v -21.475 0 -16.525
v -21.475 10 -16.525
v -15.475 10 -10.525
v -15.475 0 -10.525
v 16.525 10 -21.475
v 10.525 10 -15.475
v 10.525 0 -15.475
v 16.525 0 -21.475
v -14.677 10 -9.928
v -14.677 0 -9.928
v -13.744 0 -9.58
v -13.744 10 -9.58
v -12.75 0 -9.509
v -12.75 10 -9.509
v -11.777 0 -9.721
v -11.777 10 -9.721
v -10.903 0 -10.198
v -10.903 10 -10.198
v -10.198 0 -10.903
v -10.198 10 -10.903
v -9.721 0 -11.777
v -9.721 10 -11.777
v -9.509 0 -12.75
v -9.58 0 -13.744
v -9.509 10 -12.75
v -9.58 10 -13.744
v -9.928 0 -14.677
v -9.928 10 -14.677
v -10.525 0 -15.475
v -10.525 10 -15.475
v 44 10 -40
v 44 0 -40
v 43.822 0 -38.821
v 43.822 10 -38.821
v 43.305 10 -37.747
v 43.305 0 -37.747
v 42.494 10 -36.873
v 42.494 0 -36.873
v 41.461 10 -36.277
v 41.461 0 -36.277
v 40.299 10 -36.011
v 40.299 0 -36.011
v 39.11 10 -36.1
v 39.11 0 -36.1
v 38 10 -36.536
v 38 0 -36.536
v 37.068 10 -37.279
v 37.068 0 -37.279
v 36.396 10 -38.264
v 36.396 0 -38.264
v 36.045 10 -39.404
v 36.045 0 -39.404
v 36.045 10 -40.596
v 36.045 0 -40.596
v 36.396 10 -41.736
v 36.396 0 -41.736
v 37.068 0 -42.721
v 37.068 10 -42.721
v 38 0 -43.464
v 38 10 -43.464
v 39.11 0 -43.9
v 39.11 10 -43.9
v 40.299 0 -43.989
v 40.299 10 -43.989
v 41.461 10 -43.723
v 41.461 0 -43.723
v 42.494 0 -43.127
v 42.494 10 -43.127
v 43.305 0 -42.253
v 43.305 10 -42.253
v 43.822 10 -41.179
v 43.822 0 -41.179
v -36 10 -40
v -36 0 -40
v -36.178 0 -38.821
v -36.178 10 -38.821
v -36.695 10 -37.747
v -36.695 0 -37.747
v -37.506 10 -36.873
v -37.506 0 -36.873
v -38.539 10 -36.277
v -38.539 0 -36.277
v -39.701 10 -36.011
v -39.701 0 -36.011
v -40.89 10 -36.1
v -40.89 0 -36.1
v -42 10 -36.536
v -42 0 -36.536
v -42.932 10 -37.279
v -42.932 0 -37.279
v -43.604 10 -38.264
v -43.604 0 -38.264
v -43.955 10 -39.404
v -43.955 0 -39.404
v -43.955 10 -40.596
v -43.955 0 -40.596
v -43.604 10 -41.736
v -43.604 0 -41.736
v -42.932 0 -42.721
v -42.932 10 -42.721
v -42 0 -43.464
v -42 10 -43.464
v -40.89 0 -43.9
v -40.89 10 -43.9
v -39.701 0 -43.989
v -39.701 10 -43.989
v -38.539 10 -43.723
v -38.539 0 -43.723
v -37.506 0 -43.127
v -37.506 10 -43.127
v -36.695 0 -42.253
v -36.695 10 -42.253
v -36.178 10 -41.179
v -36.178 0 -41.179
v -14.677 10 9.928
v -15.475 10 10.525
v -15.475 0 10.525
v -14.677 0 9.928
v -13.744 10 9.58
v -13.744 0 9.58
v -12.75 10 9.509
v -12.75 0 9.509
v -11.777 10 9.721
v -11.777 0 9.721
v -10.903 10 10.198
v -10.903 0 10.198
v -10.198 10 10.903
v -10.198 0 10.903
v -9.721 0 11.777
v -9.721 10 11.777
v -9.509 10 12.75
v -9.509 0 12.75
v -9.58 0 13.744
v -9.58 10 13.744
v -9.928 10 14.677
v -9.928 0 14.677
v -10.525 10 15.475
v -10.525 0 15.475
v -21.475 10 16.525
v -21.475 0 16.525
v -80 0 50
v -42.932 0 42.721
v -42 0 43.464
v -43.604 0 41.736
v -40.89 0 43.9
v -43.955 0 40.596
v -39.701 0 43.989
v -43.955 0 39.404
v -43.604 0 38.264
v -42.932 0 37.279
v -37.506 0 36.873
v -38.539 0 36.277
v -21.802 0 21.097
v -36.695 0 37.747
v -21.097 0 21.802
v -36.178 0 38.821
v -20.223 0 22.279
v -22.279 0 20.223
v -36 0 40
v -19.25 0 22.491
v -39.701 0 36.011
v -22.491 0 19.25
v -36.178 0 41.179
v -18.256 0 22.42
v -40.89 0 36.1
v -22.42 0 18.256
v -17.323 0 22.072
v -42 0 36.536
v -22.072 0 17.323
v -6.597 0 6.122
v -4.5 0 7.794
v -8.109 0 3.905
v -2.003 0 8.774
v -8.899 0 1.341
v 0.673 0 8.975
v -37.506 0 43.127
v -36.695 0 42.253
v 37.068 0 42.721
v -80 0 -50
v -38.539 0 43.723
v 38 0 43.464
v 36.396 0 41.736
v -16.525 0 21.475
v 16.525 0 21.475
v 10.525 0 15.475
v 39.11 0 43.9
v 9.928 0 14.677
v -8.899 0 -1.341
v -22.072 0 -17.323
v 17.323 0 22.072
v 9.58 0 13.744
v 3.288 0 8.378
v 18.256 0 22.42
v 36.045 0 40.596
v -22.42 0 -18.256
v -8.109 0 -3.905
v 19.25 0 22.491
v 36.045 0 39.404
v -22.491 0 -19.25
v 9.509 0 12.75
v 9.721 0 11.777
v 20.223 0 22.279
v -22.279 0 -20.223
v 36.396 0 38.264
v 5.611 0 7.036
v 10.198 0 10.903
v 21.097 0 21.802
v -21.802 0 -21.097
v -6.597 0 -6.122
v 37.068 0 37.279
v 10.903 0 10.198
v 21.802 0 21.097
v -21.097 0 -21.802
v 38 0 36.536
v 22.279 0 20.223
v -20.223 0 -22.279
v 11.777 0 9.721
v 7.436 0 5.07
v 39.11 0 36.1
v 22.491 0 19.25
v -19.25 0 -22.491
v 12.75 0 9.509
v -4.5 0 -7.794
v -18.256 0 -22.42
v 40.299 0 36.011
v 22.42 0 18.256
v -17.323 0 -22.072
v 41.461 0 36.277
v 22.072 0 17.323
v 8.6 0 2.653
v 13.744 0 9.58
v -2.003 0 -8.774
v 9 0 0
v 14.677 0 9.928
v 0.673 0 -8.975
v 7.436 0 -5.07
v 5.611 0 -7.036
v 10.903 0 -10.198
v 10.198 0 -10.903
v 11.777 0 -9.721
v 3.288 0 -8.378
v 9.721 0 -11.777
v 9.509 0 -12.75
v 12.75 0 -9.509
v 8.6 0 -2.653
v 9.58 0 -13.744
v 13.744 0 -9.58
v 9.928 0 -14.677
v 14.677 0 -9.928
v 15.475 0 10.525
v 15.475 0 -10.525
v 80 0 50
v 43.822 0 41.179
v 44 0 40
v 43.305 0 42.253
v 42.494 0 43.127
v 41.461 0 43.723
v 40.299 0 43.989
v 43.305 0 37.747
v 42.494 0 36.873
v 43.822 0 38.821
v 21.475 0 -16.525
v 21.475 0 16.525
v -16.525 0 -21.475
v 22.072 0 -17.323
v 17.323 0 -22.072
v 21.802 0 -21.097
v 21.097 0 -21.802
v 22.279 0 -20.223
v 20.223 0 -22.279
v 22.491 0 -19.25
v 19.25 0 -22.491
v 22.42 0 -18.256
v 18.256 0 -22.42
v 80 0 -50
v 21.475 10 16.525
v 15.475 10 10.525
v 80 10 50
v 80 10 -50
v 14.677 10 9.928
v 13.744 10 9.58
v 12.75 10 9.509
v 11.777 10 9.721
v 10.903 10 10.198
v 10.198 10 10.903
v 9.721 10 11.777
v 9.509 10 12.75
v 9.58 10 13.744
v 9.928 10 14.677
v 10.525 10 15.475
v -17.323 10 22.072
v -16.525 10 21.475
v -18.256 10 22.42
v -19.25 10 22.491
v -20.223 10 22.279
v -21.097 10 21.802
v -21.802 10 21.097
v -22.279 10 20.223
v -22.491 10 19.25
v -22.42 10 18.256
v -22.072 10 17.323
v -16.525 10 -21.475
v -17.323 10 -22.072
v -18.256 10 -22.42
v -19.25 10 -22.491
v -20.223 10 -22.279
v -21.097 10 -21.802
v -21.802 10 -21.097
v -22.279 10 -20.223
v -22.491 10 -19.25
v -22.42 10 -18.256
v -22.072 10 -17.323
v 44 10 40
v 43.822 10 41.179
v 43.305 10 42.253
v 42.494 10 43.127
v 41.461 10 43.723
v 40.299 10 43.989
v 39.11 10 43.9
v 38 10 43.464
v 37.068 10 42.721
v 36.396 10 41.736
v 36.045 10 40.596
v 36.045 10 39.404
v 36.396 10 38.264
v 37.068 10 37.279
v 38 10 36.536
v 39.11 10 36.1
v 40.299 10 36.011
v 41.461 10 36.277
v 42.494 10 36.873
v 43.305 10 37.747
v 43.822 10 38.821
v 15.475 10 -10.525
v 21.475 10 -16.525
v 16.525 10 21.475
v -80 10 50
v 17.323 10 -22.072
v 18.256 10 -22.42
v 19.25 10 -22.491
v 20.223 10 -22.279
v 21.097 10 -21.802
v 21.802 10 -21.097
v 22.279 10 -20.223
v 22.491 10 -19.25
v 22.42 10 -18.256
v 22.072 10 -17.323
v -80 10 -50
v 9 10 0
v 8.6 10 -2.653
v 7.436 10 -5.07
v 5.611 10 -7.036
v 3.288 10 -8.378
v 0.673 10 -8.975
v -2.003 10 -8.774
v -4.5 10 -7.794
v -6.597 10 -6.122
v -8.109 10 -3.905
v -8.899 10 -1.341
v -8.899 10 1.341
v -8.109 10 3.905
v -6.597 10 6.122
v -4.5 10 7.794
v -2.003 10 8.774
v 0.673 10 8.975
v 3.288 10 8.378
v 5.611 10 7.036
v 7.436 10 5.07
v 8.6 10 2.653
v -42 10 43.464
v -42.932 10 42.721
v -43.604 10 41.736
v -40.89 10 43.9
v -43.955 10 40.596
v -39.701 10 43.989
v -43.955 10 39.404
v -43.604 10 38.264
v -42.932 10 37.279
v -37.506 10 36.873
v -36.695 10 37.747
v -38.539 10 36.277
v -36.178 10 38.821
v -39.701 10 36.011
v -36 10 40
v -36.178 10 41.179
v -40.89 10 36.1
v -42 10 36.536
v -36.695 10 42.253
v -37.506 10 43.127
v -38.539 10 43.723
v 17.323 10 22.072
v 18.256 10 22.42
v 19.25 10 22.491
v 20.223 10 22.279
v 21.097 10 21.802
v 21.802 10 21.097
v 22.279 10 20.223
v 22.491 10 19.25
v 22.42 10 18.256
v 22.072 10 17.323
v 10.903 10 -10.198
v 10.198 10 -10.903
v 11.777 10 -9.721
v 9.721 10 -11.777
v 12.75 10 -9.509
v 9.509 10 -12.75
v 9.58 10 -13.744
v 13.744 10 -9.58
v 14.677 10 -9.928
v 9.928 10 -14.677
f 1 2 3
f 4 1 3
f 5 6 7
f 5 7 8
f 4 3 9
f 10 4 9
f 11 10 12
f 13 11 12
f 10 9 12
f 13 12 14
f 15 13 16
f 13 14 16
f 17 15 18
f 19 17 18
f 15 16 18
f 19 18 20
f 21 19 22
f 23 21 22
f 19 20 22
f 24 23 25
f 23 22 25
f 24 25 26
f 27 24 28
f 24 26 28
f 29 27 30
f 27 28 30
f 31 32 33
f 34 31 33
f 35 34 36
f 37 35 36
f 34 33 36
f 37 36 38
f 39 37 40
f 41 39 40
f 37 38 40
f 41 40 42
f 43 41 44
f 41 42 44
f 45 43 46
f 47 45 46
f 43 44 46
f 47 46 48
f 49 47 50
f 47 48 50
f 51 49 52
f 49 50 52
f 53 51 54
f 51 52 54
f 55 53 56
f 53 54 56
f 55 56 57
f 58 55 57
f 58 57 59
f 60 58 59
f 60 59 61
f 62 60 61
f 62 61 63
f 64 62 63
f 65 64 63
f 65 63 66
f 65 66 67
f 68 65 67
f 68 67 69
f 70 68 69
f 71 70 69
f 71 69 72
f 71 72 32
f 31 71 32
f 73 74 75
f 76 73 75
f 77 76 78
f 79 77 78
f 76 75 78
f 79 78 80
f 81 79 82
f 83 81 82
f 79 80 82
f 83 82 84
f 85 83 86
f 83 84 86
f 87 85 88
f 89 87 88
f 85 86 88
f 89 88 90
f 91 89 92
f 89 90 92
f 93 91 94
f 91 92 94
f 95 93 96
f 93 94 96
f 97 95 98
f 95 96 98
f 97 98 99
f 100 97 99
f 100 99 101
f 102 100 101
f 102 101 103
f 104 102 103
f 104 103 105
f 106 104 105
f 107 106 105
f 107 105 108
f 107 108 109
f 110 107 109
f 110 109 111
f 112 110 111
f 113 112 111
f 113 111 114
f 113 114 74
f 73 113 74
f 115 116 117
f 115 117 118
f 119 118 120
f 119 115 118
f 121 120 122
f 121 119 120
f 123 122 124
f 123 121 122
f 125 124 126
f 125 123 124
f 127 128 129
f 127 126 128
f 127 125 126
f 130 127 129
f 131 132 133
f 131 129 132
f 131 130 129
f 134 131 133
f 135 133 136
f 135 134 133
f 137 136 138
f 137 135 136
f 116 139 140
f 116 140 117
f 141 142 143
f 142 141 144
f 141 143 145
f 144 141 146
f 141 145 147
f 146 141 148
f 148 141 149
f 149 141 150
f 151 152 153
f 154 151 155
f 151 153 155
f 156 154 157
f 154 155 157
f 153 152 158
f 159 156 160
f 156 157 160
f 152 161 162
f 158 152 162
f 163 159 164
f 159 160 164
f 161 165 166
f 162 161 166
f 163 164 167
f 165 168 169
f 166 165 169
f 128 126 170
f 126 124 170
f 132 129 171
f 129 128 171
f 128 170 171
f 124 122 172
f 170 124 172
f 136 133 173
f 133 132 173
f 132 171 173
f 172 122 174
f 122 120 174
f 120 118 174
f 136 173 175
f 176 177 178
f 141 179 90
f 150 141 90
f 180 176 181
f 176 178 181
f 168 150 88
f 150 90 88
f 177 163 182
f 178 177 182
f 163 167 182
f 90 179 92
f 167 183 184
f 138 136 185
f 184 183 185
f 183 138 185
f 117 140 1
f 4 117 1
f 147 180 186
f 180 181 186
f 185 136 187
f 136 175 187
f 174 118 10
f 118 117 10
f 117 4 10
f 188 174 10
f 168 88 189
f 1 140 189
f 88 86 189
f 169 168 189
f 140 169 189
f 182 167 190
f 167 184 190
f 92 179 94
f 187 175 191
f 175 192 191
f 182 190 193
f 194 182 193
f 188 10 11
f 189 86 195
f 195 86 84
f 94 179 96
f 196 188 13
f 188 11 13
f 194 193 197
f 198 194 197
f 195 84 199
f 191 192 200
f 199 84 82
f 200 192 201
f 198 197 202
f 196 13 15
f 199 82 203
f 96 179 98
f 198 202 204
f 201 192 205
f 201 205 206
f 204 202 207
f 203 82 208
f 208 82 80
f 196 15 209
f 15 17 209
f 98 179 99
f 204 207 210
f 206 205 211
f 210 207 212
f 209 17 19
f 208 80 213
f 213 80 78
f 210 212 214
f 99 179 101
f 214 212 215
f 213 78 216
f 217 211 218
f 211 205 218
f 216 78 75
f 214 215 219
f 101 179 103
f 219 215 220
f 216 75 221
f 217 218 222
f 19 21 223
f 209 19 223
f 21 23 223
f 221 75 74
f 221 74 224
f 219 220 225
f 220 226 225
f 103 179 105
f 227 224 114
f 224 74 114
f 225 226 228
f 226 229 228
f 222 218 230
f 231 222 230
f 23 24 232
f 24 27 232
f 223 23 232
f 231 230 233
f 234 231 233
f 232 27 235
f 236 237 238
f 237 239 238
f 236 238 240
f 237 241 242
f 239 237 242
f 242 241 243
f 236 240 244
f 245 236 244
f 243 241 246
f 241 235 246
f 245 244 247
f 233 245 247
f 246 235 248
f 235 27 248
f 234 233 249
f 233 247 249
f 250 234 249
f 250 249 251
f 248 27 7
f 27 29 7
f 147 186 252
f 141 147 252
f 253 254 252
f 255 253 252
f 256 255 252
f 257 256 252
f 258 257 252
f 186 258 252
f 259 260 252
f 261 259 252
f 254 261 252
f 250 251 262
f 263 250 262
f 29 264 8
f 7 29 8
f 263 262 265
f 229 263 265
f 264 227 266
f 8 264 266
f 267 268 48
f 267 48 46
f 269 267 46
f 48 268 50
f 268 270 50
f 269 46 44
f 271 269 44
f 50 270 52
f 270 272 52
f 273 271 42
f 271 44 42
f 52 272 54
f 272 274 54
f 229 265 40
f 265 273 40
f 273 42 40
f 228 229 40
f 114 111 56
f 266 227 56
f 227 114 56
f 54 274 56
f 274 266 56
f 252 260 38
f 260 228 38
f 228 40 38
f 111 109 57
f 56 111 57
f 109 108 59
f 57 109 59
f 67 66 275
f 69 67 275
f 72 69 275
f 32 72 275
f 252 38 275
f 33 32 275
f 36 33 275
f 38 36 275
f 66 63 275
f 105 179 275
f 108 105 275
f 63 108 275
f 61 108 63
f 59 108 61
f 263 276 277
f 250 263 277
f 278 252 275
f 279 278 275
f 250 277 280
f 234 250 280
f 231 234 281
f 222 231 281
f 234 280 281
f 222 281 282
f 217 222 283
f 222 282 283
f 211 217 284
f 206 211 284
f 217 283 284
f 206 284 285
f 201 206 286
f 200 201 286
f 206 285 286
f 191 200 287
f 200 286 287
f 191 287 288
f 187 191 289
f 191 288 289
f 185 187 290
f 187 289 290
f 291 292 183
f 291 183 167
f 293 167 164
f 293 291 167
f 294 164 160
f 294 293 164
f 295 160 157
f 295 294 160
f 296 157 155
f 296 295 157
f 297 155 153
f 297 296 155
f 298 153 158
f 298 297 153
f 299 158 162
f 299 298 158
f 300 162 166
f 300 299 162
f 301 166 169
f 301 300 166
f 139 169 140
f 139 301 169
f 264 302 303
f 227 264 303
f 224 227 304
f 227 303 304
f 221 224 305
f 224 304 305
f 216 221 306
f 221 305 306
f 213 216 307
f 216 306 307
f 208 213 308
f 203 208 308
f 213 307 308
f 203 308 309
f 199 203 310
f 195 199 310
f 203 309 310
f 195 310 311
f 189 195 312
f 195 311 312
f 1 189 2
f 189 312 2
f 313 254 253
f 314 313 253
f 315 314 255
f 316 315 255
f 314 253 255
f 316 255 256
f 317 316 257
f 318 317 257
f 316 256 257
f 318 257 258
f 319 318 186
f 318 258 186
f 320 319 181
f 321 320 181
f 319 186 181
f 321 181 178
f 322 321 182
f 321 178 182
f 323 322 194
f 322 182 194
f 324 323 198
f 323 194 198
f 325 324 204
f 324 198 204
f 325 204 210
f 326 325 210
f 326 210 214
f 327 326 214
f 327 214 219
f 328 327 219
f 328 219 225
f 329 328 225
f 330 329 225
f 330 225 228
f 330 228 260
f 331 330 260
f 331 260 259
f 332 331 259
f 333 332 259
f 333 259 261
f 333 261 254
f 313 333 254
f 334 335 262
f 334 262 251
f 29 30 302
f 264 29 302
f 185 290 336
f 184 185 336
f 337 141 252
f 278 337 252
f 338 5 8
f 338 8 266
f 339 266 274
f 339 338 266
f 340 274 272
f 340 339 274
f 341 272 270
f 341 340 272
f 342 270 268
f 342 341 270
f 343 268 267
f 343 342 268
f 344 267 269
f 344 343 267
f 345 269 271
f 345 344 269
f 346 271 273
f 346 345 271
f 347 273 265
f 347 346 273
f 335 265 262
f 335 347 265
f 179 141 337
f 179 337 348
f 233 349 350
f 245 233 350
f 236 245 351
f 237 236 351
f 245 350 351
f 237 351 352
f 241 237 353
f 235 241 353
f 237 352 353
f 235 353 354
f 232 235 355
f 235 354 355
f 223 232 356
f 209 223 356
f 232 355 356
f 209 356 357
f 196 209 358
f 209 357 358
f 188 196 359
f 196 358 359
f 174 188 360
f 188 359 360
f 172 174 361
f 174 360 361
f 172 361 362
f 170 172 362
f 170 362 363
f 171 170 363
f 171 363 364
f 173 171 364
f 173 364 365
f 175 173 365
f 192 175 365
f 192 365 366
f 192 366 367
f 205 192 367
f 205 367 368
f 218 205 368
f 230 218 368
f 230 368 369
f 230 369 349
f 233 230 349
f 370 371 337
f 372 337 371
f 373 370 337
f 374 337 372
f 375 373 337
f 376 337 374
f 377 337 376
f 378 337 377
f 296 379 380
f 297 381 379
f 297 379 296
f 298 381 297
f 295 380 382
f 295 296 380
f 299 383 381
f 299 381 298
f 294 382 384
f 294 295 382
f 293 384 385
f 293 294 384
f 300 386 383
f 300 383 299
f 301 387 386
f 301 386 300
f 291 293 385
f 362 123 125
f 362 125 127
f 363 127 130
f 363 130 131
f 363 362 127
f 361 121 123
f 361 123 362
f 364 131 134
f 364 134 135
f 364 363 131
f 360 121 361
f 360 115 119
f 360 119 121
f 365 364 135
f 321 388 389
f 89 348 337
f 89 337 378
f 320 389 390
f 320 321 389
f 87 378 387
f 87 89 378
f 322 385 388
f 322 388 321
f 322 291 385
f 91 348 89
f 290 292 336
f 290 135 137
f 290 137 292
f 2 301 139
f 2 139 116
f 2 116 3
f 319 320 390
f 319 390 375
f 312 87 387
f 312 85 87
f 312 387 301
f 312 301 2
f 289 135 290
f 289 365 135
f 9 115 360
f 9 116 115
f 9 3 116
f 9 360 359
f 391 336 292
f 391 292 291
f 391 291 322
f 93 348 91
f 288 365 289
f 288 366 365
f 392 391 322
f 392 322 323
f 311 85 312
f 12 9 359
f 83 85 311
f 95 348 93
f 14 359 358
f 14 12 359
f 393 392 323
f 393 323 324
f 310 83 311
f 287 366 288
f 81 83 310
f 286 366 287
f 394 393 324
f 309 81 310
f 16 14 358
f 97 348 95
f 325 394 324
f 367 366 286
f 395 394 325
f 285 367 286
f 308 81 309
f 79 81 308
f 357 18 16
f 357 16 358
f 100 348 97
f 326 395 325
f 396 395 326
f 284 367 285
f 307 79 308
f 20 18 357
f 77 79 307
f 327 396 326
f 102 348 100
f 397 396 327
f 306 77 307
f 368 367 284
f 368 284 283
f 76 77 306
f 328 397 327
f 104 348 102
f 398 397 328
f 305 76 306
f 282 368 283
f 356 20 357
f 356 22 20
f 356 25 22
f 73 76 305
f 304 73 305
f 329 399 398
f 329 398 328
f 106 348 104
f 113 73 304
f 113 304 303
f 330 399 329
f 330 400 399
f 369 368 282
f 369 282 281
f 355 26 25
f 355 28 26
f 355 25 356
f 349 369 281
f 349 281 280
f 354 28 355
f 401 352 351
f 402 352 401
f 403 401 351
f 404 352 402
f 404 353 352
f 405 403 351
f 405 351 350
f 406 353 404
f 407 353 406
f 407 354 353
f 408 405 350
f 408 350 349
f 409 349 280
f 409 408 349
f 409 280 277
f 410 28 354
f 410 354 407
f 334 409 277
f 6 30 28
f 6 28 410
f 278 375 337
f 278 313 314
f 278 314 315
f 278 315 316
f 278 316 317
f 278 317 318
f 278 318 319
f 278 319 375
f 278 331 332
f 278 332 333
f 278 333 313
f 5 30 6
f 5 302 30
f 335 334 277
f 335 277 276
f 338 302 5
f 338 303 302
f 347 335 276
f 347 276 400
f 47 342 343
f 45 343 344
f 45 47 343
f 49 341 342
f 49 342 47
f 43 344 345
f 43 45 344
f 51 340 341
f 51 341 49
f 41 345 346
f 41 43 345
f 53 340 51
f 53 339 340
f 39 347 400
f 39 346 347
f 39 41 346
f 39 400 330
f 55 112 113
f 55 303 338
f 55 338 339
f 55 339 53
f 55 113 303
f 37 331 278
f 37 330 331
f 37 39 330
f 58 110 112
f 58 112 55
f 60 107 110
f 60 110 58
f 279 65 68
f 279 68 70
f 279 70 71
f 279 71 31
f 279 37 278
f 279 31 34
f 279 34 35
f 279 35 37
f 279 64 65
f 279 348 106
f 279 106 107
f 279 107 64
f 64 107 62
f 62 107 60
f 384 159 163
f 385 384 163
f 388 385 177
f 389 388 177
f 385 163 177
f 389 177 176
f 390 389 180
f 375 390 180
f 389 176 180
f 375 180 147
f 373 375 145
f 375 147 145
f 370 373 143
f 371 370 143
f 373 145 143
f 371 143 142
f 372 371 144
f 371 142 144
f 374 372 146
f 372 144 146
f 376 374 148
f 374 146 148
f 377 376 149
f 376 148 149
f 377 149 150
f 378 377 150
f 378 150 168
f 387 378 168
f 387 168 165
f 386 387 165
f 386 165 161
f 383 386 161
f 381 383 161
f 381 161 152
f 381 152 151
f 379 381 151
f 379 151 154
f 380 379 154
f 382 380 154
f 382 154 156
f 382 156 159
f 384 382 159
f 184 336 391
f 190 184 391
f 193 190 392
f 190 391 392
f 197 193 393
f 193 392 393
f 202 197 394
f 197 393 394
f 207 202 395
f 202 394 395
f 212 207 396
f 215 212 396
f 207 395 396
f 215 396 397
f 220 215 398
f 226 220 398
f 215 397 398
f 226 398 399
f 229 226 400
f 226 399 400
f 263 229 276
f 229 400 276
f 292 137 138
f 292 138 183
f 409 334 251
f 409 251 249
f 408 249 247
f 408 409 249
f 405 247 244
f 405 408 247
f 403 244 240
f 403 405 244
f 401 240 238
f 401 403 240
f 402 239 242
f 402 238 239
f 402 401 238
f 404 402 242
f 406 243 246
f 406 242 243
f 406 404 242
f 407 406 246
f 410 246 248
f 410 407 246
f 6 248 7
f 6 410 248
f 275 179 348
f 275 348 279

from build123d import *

# Parameters (mm, degrees)
SKETCH1_W          = 160
SKETCH1_H          = 100
BASE_DEPTH         = 10
SKETCH2_R          = 9
ACTUATOR_CUT_DEPTH = 40
CUT_EXTRUDE1_REACH = 12
CUT_EXTRUDE2_REACH = 12
SKETCH5_R          = 3
SKETCH6_R          = 4
CUT_EXTRUDE3_DEPTH = 11


with BuildPart() as part:
    # Sketch1 → base (new body)
    with BuildSketch(Plane(origin=(0, 0, 0), x_dir=(1, 0, 0), z_dir=(0, 1, 0))):
        Rectangle(SKETCH1_W, SKETCH1_H)
    extrude(amount=BASE_DEPTH)

    # Sketch2 → actuator cut (cut)
    with BuildSketch(Plane(origin=(0, 10, 0), x_dir=(1, 0, 0), z_dir=(0, 1, 0))):
        Circle(SKETCH2_R)
    extrude(amount=-ACTUATOR_CUT_DEPTH, mode=Mode.SUBTRACT)

    # Sketch3 → Cut-Extrude1 (cut, up to next)
    with BuildSketch(Plane(origin=(0, 10, 0), x_dir=(1, 0, 0), z_dir=(0, 1, 0)), mode=Mode.PRIVATE) as cut_extrude1_sk1:
        with BuildLine():
            Line((-21.474873734, -16.525126266), (-15.474873734, -10.525126266))
            ThreePointArc((-15.474873734, -10.525126266), (-10.525126266, -10.525126266), (-10.525126266, -15.474873734))
            Line((-10.525126266, -15.474873734), (-16.525126266, -21.474873734))
            ThreePointArc((-16.525126266, -21.474873734), (-21.474873734, -21.474873734), (-21.474873734, -16.525126266))
        make_face()
    cut_extrude1_tool1 = extrude(cut_extrude1_sk1.sketch, amount=-CUT_EXTRUDE1_REACH, mode=Mode.PRIVATE) & part.part
    add(cut_extrude1_tool1.solids().sort_by_distance((-16, 10, 16))[0], mode=Mode.SUBTRACT)
    # Sketch3 → Cut-Extrude1 (cut, up to next)
    with BuildSketch(Plane(origin=(0, 10, 0), x_dir=(1, 0, 0), z_dir=(0, 1, 0)), mode=Mode.PRIVATE) as cut_extrude1_sk2:
        with BuildLine():
            Line((21.474873734, -16.525126266), (15.474873734, -10.525126266))
            ThreePointArc((15.474873734, -10.525126266), (10.525126266, -10.525126266), (10.525126266, -15.474873734))
            Line((10.525126266, -15.474873734), (16.525126266, -21.474873734))
            ThreePointArc((16.525126266, -21.474873734), (21.474873734, -21.474873734), (21.474873734, -16.525126266))
        make_face()
    cut_extrude1_tool2 = extrude(cut_extrude1_sk2.sketch, amount=-CUT_EXTRUDE1_REACH, mode=Mode.PRIVATE) & part.part
    add(cut_extrude1_tool2.solids().sort_by_distance((16, 10, 16))[0], mode=Mode.SUBTRACT)
    # Sketch3 → Cut-Extrude1 (cut, up to next)
    with BuildSketch(Plane(origin=(0, 10, 0), x_dir=(1, 0, 0), z_dir=(0, 1, 0)), mode=Mode.PRIVATE) as cut_extrude1_sk3:
        with BuildLine():
            Line((21.474873734, 16.525126266), (15.474873734, 10.525126266))
            ThreePointArc((15.474873734, 10.525126266), (10.525126266, 10.525126266), (10.525126266, 15.474873734))
            Line((10.525126266, 15.474873734), (16.525126266, 21.474873734))
            ThreePointArc((16.525126266, 21.474873734), (21.474873734, 21.474873734), (21.474873734, 16.525126266))
        make_face()
    cut_extrude1_tool3 = extrude(cut_extrude1_sk3.sketch, amount=-CUT_EXTRUDE1_REACH, mode=Mode.PRIVATE) & part.part
    add(cut_extrude1_tool3.solids().sort_by_distance((16, 10, -16))[0], mode=Mode.SUBTRACT)
    # Sketch3 → Cut-Extrude1 (cut, up to next)
    with BuildSketch(Plane(origin=(0, 10, 0), x_dir=(1, 0, 0), z_dir=(0, 1, 0)), mode=Mode.PRIVATE) as cut_extrude1_sk4:
        with BuildLine():
            Line((-21.474873734, 16.525126266), (-15.474873734, 10.525126266))
            ThreePointArc((-15.474873734, 10.525126266), (-10.525126266, 10.525126266), (-10.525126266, 15.474873734))
            Line((-10.525126266, 15.474873734), (-16.525126266, 21.474873734))
            ThreePointArc((-16.525126266, 21.474873734), (-21.474873734, 21.474873734), (-21.474873734, 16.525126266))
        make_face()
    cut_extrude1_tool4 = extrude(cut_extrude1_sk4.sketch, amount=-CUT_EXTRUDE1_REACH, mode=Mode.PRIVATE) & part.part
    add(cut_extrude1_tool4.solids().sort_by_distance((-16, 10, -16))[0], mode=Mode.SUBTRACT)

    # Sketch5 → Cut-Extrude2 (cut, up to next)
    with BuildSketch(Plane(origin=(0, 10, 0), x_dir=(1, 0, 0), z_dir=(0, 1, 0)), mode=Mode.PRIVATE) as cut_extrude2_sk1:
        with Locations((-40, -40)):
            Circle(SKETCH5_R)
    cut_extrude2_tool1 = extrude(cut_extrude2_sk1.sketch, amount=-CUT_EXTRUDE2_REACH, mode=Mode.PRIVATE) & part.part
    add(cut_extrude2_tool1.solids().sort_by_distance((-40, 10, 40))[0], mode=Mode.SUBTRACT)
    # Sketch5 → Cut-Extrude2 (cut, up to next)
    with BuildSketch(Plane(origin=(0, 10, 0), x_dir=(1, 0, 0), z_dir=(0, 1, 0)), mode=Mode.PRIVATE) as cut_extrude2_sk2:
        with Locations((-40, 40)):
            Circle(SKETCH5_R)
    cut_extrude2_tool2 = extrude(cut_extrude2_sk2.sketch, amount=-CUT_EXTRUDE2_REACH, mode=Mode.PRIVATE) & part.part
    add(cut_extrude2_tool2.solids().sort_by_distance((-40, 10, -40))[0], mode=Mode.SUBTRACT)
    # Sketch5 → Cut-Extrude2 (cut, up to next)
    with BuildSketch(Plane(origin=(0, 10, 0), x_dir=(1, 0, 0), z_dir=(0, 1, 0)), mode=Mode.PRIVATE) as cut_extrude2_sk3:
        with Locations((40, -40)):
            Circle(SKETCH5_R)
    cut_extrude2_tool3 = extrude(cut_extrude2_sk3.sketch, amount=-CUT_EXTRUDE2_REACH, mode=Mode.PRIVATE) & part.part
    add(cut_extrude2_tool3.solids().sort_by_distance((40, 10, 40))[0], mode=Mode.SUBTRACT)
    # Sketch5 → Cut-Extrude2 (cut, up to next)
    with BuildSketch(Plane(origin=(0, 10, 0), x_dir=(1, 0, 0), z_dir=(0, 1, 0)), mode=Mode.PRIVATE) as cut_extrude2_sk4:
        with Locations((40, 40)):
            Circle(SKETCH5_R)
    cut_extrude2_tool4 = extrude(cut_extrude2_sk4.sketch, amount=-CUT_EXTRUDE2_REACH, mode=Mode.PRIVATE) & part.part
    add(cut_extrude2_tool4.solids().sort_by_distance((40, 10, -40))[0], mode=Mode.SUBTRACT)

    # Sketch6 → Cut-Extrude3 (cut, through all)
    with BuildSketch(Plane.XZ):
        with Locations((-40, 40)):
            Circle(SKETCH6_R)
        with Locations((40, 40)):
            Circle(SKETCH6_R)
        with Locations((40, -40)):
            Circle(SKETCH6_R)
        with Locations((-40, -40)):
            Circle(SKETCH6_R)
    extrude(amount=-CUT_EXTRUDE3_DEPTH, mode=Mode.SUBTRACT)


solid = part.part
